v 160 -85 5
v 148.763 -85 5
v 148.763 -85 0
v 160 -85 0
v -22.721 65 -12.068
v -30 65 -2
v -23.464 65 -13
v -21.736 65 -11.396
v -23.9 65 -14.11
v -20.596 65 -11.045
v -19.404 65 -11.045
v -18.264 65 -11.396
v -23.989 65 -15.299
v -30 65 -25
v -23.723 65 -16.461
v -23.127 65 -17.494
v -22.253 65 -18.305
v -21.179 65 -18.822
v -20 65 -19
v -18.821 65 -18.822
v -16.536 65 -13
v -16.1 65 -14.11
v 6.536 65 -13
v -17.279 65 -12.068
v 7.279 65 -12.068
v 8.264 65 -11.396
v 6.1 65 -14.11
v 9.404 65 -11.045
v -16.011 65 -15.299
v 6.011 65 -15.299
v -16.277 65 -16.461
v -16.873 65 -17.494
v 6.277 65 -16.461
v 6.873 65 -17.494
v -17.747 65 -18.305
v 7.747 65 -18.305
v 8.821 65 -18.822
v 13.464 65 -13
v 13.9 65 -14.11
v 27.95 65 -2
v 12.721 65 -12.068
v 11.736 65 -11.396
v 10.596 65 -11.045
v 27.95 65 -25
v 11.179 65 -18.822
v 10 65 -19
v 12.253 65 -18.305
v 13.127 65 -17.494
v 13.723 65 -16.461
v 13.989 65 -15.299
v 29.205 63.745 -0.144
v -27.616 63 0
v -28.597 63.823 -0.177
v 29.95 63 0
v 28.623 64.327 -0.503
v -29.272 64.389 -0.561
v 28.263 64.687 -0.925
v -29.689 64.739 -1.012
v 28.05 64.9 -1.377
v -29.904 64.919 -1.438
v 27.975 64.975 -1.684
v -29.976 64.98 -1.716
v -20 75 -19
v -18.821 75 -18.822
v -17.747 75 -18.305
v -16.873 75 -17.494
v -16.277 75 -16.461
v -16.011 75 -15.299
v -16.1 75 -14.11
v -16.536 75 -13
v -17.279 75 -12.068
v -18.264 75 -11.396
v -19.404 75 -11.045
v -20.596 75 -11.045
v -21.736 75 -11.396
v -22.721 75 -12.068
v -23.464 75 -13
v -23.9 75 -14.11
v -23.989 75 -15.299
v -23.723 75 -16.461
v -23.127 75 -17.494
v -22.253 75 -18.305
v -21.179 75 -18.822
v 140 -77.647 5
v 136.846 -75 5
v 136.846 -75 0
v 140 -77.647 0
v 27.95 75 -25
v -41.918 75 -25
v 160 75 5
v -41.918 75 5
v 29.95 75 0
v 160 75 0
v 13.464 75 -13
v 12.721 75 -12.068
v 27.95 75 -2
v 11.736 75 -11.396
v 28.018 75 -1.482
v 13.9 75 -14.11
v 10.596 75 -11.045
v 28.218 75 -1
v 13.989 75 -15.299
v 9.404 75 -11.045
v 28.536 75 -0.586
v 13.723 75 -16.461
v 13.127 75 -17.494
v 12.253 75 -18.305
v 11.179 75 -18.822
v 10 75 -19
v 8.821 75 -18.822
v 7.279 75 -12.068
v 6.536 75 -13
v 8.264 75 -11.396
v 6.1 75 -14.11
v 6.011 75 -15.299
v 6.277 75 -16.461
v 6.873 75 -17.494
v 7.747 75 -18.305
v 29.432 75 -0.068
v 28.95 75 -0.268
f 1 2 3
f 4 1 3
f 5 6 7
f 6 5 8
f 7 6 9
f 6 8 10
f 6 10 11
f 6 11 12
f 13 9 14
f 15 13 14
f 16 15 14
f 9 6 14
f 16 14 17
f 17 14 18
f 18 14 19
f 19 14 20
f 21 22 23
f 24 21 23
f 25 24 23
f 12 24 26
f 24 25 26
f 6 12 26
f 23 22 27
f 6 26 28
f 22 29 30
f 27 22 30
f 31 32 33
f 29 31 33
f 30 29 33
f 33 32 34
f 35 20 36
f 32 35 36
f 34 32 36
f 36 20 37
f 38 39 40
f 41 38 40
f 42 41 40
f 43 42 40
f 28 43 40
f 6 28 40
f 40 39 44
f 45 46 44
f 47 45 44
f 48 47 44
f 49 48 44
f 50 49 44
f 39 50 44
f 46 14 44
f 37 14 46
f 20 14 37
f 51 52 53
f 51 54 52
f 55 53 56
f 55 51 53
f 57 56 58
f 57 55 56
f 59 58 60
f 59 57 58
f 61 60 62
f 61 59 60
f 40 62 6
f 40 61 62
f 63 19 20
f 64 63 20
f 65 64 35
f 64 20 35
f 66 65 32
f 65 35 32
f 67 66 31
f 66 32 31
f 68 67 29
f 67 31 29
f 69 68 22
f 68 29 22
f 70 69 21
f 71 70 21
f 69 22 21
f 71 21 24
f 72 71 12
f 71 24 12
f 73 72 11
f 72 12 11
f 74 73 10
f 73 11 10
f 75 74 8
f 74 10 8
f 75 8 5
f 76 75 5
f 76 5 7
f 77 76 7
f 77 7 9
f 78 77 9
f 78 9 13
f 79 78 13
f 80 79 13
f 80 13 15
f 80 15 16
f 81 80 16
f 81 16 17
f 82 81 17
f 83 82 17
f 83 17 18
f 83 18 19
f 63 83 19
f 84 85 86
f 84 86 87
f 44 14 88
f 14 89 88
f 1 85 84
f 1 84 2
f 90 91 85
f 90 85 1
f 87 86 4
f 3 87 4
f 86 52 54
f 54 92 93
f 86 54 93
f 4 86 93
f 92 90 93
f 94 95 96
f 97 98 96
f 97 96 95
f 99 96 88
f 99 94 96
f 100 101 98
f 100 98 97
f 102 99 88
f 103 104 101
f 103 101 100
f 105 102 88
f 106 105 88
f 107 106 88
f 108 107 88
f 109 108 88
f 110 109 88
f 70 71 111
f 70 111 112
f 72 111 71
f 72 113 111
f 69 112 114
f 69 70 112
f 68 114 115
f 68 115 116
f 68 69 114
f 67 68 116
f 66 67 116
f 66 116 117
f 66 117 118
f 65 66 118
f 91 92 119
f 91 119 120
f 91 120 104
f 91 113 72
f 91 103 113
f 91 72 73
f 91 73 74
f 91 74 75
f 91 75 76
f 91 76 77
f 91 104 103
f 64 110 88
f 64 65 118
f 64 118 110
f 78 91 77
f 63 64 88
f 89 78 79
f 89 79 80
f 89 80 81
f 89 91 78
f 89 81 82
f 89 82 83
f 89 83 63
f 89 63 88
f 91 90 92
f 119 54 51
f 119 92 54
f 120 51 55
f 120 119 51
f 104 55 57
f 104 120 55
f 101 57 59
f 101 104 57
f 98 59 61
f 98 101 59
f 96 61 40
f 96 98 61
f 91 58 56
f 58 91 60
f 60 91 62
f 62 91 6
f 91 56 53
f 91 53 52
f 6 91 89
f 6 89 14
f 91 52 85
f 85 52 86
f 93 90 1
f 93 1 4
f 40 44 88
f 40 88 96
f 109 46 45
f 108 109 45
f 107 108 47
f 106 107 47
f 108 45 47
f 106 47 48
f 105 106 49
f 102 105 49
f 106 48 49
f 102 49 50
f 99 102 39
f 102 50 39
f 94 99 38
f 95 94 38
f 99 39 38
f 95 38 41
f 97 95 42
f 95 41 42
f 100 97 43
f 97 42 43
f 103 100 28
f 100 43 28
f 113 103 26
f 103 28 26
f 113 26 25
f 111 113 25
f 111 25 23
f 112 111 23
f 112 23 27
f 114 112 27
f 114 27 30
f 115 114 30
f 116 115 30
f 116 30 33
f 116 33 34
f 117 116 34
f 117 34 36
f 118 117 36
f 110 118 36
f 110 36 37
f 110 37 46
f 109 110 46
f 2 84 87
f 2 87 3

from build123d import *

# Parameters (mm, degrees)
SKETCH_2_W          = 280
SKETCH_2_H          = 150
EXTRUDE_1_DEPTH     = 5
SKETCH_3_W          = 280
SKETCH_3_H          = 25
EXTRUDE_2_DEPTH     = 10
CUT_EXTRUDE_1_DEPTH = 25
SKETCH_5_R          = 4
CUT_EXTRUDE_2_DEPTH = 50
SKETCH_6_W          = 5
SKETCH_6_H          = 160
EXTRUDE_3_DEPTH     = 20
EXTRUDE_4_DEPTH     = 5
CUT_EXTRUDE_3_DEPTH = 20
SKETCH_9_W          = 112.05
SKETCH_9_H          = 25
CUT_EXTRUDE_4_DEPTH = 20
FILLET_1_R          = 2


with BuildPart() as part:
    # 草图2 → 凸台-拉伸1 (new body)
    with BuildSketch(Plane.XY):
        Rectangle(SKETCH_2_W, SKETCH_2_H)
    extrude(amount=EXTRUDE_1_DEPTH)

    # 草图3 → 凸台-拉伸2 (add)
    with BuildSketch(Plane(origin=(0, 75, 0), x_dir=(1, 0, 0), z_dir=(0, 1, 0))):
        with Locations((0, 12.5)):
            Rectangle(SKETCH_3_W, SKETCH_3_H)
    extrude(amount=-EXTRUDE_2_DEPTH)

    # 草图4 → 切除-拉伸1 (cut, symmetric)
    with BuildSketch(Plane(origin=(0, 0, 0), x_dir=(-1, 0, 0), z_dir=(0, 0, -1))):
        Polygon((75.462063134, 103.147200408), (-172.007852349, -104.504714401), (179.32828037, -108.521449105), (159.998225544, 98.6463124), align=None)
    extrude(amount=CUT_EXTRUDE_1_DEPTH, both=True, mode=Mode.SUBTRACT)

    # 草图5 → 切除-拉伸2 (cut)
    with BuildSketch(Plane.XZ.offset(-65)):
        with Locations(Location((-20, -15, 0), (0, 0, 270))):
            Circle(SKETCH_5_R)
        with Locations(Location((10, -15, 0), (0, 0, 270))):
            Circle(SKETCH_5_R)
    extrude(amount=-CUT_EXTRUDE_2_DEPTH, mode=Mode.SUBTRACT)

    # 草图6 → 凸台-拉伸3 (add)
    with BuildSketch(Plane(origin=(140, 0, 0), x_dir=(0, 0, -1), z_dir=(1, 0, 0))):
        with Locations((-2.5, -5)):
            Rectangle(SKETCH_6_W, SKETCH_6_H)
    extrude(amount=EXTRUDE_3_DEPTH)

    # 草图7 → 凸台-拉伸4 (add)
    with BuildSketch(Plane.XY.offset(5)):
        Polygon((136.845502963, -75), (140, -77.6469373), (140, -75), align=None)
    extrude(amount=-EXTRUDE_4_DEPTH)

    # 草图8 → 切除-拉伸3 (cut)
    with BuildSketch(Plane.XY.offset(5)):
        Polygon((140, -77.6469373), (153.856787924, -89.274162936), (129.719459365, -89.898808536), align=None)
    extrude(amount=-CUT_EXTRUDE_3_DEPTH, mode=Mode.SUBTRACT)

    # 草图9 → 切除-拉伸4 (cut)
    with BuildSketch(Plane.XZ.offset(-65)):
        with Locations((83.975, -12.5)):
            Rectangle(SKETCH_9_W, SKETCH_9_H)
    extrude(amount=-CUT_EXTRUDE_4_DEPTH, mode=Mode.SUBTRACT)

    # 圆角1
    fillet_1_edges = [part.edges().sort_by_distance(p)[0] for p in [
        (27.95, 70, 0),
        (-1.025, 65, 0),
    ]]
    fillet(fillet_1_edges, radius=FILLET_1_R)


solid = part.part
